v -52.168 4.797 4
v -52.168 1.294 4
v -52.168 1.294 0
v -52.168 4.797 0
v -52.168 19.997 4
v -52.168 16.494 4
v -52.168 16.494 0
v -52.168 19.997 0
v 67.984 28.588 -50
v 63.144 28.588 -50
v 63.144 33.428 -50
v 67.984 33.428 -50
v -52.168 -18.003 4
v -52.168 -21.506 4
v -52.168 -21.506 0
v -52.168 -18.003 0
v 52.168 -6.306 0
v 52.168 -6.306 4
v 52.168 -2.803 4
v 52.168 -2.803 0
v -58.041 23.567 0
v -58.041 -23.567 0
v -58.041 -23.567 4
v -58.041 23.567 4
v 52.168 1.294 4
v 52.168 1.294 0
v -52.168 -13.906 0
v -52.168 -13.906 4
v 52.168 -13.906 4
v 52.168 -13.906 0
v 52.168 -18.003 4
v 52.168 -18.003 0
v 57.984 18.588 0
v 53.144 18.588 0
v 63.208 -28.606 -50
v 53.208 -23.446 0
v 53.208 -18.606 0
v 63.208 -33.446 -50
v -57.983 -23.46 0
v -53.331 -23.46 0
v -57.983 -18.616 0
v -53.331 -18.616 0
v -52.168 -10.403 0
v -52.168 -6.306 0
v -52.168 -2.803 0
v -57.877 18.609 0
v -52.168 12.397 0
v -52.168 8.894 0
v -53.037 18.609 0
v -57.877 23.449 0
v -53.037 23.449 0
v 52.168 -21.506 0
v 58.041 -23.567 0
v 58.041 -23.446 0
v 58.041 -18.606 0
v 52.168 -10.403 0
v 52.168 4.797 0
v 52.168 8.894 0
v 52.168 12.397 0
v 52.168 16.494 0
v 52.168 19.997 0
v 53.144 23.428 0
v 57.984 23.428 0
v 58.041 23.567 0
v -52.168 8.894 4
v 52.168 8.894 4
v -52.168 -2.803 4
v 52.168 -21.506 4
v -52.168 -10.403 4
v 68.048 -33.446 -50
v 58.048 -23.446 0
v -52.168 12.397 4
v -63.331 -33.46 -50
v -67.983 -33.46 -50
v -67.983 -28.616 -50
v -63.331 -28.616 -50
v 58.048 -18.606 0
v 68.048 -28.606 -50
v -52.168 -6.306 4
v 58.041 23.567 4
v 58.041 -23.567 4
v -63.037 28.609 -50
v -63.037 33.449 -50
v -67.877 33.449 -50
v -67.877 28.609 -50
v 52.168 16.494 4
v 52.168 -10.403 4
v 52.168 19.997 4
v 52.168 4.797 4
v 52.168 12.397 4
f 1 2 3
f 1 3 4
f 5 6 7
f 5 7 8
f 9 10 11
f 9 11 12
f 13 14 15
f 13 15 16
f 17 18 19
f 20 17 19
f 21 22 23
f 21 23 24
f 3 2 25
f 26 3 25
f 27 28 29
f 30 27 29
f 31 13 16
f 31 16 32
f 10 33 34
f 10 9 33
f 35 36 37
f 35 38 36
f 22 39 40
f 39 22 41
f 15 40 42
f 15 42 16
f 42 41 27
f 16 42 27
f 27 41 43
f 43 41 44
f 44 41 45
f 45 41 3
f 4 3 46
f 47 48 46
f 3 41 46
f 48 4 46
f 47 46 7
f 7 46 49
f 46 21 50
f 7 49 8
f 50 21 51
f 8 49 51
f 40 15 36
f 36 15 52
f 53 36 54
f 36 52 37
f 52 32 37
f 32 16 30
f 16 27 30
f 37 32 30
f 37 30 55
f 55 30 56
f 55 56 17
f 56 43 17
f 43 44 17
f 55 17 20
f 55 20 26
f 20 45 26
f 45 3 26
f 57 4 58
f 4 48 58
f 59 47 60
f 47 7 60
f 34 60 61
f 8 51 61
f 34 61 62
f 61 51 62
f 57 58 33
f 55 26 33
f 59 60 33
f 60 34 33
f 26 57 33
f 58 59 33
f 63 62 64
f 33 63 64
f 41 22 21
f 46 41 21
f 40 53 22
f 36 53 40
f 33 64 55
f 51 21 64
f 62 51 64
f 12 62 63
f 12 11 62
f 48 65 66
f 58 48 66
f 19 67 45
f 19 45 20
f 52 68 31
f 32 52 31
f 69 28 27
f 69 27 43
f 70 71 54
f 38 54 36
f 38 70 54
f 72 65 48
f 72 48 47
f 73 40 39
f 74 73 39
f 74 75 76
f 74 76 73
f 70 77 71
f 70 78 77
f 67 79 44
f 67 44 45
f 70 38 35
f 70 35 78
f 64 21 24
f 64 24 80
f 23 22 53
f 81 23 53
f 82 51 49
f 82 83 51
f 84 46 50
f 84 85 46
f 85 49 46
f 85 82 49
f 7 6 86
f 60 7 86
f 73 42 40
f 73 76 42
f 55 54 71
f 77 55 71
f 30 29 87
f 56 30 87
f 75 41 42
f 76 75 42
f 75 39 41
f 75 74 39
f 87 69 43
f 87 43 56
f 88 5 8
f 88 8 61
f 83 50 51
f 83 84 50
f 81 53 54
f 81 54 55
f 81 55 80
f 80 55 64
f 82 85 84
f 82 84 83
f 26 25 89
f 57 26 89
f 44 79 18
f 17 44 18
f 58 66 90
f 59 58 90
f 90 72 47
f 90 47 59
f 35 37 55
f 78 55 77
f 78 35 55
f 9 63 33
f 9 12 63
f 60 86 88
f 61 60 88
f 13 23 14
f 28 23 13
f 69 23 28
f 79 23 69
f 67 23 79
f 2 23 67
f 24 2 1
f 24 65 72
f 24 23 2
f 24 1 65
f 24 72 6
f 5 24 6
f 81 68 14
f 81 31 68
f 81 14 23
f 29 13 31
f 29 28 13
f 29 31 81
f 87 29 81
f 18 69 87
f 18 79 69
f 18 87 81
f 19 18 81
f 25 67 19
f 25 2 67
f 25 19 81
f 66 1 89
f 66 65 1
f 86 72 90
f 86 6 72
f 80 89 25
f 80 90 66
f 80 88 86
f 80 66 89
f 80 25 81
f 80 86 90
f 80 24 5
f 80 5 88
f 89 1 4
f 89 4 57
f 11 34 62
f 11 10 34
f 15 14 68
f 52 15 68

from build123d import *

# Parameters (mm, degrees)
SKETCH_W            = 116.082786
SKETCH_H            = 47.133754
PAD_DEPTH           = 4
SKETCH001_W         = 104.335838
SKETCH001_H         = 3.503182
POCKET_DEPTH        = 9
LINEARPATTERN_COUNT = 6
LINEARPATTERN_PITCH = 7.6
SKETCH002_W         = 4.652203
SKETCH002_H         = 4.844048
SKETCH003_W         = 4.652203
SKETCH003_H         = 4.844048
SKETCH004_W         = 4.84
SKETCH004_H         = 4.84
SKETCH005_W         = 4.84
SKETCH005_H         = 4.84
SKETCH006_W         = 4.84
SKETCH006_H         = 4.84
SKETCH007_W         = 4.84
SKETCH007_H         = 4.84
SKETCH008_W         = 4.84
SKETCH008_H         = 4.84
SKETCH009_W         = 4.84
SKETCH009_H         = 4.84


with BuildPart() as part:
    # Sketch → Pad (new body)
    with BuildSketch(Plane.XY):
        Rectangle(SKETCH_W, SKETCH_H)
    extrude(amount=PAD_DEPTH)

    # Sketch001 (on Face6 of Pad) → Pocket (cut)
    with BuildSketch(Plane.XY.offset(4)):
        with Locations((0, 18.245884)):
            Rectangle(SKETCH001_W, SKETCH001_H)
    pocket = extrude(amount=-POCKET_DEPTH, mode=Mode.SUBTRACT)

    # LinearPattern: Pocket ×6
    with Locations(*[(0, -i * LINEARPATTERN_PITCH, 0) for i in range(1, LINEARPATTERN_COUNT)]):
        add(pocket, mode=Mode.SUBTRACT)

    # Sketch002 (on Face4 of LinearPattern) → AdditiveLoft section 0
    with BuildSketch(Plane(origin=(0, 0, 0), x_dir=(1, 0, 0), z_dir=(0, 0, -1))):
        with Locations((-55.65727, 21.038372)):
            Rectangle(SKETCH002_W, SKETCH002_H)
    # Sketch003 (on Face4 of LinearPattern) → AdditiveLoft section 1
    with BuildSketch(Plane(origin=(-10, -10, -50), x_dir=(1, 0, 0), z_dir=(0, 0, -1))):
        with Locations((-55.65727, 21.038372)):
            Rectangle(SKETCH003_W, SKETCH003_H)
    loft()

    # Sketch004 (on Face4 of AdditiveLoft) → AdditiveLoft001 section 0
    with BuildSketch(Plane(origin=(0, 0, 0), x_dir=(1, 0, 0), z_dir=(0, 0, -1))):
        with Locations((55.627524, 21.025991)):
            Rectangle(SKETCH004_W, SKETCH004_H)
    # Sketch005 (on Face4 of AdditiveLoft) → AdditiveLoft001 section 1
    with BuildSketch(Plane(origin=(10, -10, -50), x_dir=(1, 0, 0), z_dir=(0, 0, -1))):
        with Locations((55.627524, 21.025991)):
            Rectangle(SKETCH005_W, SKETCH005_H)
    loft()

    # Sketch006 (on Face4 of AdditiveLoft001) → AdditiveLoft002 section 0
    with BuildSketch(Plane(origin=(0, 0, 0), x_dir=(1, 0, 0), z_dir=(0, 0, -1))):
        with Locations((-55.457449, -21.029405)):
            Rectangle(SKETCH006_W, SKETCH006_H)
    # Sketch007 (on Face4 of AdditiveLoft001) → AdditiveLoft002 section 1
    with BuildSketch(Plane(origin=(-10, 10, -50), x_dir=(1, 0, 0), z_dir=(0, 0, -1))):
        with Locations((-55.457449, -21.029405)):
            Rectangle(SKETCH007_W, SKETCH007_H)
    loft()

    # Sketch008 (on Face4 of AdditiveLoft002) → AdditiveLoft003 section 0
    with BuildSketch(Plane(origin=(0, 0, 0), x_dir=(1, 0, 0), z_dir=(0, 0, -1))):
        with Locations((55.563696, -21.007741)):
            Rectangle(SKETCH008_W, SKETCH008_H)
    # Sketch009 (on Face4 of AdditiveLoft002) → AdditiveLoft003 section 1
    with BuildSketch(Plane(origin=(10, 10, -50), x_dir=(1, 0, 0), z_dir=(0, 0, -1))):
        with Locations((55.563696, -21.007741)):
            Rectangle(SKETCH009_W, SKETCH009_H)
    loft()


solid = part.part
